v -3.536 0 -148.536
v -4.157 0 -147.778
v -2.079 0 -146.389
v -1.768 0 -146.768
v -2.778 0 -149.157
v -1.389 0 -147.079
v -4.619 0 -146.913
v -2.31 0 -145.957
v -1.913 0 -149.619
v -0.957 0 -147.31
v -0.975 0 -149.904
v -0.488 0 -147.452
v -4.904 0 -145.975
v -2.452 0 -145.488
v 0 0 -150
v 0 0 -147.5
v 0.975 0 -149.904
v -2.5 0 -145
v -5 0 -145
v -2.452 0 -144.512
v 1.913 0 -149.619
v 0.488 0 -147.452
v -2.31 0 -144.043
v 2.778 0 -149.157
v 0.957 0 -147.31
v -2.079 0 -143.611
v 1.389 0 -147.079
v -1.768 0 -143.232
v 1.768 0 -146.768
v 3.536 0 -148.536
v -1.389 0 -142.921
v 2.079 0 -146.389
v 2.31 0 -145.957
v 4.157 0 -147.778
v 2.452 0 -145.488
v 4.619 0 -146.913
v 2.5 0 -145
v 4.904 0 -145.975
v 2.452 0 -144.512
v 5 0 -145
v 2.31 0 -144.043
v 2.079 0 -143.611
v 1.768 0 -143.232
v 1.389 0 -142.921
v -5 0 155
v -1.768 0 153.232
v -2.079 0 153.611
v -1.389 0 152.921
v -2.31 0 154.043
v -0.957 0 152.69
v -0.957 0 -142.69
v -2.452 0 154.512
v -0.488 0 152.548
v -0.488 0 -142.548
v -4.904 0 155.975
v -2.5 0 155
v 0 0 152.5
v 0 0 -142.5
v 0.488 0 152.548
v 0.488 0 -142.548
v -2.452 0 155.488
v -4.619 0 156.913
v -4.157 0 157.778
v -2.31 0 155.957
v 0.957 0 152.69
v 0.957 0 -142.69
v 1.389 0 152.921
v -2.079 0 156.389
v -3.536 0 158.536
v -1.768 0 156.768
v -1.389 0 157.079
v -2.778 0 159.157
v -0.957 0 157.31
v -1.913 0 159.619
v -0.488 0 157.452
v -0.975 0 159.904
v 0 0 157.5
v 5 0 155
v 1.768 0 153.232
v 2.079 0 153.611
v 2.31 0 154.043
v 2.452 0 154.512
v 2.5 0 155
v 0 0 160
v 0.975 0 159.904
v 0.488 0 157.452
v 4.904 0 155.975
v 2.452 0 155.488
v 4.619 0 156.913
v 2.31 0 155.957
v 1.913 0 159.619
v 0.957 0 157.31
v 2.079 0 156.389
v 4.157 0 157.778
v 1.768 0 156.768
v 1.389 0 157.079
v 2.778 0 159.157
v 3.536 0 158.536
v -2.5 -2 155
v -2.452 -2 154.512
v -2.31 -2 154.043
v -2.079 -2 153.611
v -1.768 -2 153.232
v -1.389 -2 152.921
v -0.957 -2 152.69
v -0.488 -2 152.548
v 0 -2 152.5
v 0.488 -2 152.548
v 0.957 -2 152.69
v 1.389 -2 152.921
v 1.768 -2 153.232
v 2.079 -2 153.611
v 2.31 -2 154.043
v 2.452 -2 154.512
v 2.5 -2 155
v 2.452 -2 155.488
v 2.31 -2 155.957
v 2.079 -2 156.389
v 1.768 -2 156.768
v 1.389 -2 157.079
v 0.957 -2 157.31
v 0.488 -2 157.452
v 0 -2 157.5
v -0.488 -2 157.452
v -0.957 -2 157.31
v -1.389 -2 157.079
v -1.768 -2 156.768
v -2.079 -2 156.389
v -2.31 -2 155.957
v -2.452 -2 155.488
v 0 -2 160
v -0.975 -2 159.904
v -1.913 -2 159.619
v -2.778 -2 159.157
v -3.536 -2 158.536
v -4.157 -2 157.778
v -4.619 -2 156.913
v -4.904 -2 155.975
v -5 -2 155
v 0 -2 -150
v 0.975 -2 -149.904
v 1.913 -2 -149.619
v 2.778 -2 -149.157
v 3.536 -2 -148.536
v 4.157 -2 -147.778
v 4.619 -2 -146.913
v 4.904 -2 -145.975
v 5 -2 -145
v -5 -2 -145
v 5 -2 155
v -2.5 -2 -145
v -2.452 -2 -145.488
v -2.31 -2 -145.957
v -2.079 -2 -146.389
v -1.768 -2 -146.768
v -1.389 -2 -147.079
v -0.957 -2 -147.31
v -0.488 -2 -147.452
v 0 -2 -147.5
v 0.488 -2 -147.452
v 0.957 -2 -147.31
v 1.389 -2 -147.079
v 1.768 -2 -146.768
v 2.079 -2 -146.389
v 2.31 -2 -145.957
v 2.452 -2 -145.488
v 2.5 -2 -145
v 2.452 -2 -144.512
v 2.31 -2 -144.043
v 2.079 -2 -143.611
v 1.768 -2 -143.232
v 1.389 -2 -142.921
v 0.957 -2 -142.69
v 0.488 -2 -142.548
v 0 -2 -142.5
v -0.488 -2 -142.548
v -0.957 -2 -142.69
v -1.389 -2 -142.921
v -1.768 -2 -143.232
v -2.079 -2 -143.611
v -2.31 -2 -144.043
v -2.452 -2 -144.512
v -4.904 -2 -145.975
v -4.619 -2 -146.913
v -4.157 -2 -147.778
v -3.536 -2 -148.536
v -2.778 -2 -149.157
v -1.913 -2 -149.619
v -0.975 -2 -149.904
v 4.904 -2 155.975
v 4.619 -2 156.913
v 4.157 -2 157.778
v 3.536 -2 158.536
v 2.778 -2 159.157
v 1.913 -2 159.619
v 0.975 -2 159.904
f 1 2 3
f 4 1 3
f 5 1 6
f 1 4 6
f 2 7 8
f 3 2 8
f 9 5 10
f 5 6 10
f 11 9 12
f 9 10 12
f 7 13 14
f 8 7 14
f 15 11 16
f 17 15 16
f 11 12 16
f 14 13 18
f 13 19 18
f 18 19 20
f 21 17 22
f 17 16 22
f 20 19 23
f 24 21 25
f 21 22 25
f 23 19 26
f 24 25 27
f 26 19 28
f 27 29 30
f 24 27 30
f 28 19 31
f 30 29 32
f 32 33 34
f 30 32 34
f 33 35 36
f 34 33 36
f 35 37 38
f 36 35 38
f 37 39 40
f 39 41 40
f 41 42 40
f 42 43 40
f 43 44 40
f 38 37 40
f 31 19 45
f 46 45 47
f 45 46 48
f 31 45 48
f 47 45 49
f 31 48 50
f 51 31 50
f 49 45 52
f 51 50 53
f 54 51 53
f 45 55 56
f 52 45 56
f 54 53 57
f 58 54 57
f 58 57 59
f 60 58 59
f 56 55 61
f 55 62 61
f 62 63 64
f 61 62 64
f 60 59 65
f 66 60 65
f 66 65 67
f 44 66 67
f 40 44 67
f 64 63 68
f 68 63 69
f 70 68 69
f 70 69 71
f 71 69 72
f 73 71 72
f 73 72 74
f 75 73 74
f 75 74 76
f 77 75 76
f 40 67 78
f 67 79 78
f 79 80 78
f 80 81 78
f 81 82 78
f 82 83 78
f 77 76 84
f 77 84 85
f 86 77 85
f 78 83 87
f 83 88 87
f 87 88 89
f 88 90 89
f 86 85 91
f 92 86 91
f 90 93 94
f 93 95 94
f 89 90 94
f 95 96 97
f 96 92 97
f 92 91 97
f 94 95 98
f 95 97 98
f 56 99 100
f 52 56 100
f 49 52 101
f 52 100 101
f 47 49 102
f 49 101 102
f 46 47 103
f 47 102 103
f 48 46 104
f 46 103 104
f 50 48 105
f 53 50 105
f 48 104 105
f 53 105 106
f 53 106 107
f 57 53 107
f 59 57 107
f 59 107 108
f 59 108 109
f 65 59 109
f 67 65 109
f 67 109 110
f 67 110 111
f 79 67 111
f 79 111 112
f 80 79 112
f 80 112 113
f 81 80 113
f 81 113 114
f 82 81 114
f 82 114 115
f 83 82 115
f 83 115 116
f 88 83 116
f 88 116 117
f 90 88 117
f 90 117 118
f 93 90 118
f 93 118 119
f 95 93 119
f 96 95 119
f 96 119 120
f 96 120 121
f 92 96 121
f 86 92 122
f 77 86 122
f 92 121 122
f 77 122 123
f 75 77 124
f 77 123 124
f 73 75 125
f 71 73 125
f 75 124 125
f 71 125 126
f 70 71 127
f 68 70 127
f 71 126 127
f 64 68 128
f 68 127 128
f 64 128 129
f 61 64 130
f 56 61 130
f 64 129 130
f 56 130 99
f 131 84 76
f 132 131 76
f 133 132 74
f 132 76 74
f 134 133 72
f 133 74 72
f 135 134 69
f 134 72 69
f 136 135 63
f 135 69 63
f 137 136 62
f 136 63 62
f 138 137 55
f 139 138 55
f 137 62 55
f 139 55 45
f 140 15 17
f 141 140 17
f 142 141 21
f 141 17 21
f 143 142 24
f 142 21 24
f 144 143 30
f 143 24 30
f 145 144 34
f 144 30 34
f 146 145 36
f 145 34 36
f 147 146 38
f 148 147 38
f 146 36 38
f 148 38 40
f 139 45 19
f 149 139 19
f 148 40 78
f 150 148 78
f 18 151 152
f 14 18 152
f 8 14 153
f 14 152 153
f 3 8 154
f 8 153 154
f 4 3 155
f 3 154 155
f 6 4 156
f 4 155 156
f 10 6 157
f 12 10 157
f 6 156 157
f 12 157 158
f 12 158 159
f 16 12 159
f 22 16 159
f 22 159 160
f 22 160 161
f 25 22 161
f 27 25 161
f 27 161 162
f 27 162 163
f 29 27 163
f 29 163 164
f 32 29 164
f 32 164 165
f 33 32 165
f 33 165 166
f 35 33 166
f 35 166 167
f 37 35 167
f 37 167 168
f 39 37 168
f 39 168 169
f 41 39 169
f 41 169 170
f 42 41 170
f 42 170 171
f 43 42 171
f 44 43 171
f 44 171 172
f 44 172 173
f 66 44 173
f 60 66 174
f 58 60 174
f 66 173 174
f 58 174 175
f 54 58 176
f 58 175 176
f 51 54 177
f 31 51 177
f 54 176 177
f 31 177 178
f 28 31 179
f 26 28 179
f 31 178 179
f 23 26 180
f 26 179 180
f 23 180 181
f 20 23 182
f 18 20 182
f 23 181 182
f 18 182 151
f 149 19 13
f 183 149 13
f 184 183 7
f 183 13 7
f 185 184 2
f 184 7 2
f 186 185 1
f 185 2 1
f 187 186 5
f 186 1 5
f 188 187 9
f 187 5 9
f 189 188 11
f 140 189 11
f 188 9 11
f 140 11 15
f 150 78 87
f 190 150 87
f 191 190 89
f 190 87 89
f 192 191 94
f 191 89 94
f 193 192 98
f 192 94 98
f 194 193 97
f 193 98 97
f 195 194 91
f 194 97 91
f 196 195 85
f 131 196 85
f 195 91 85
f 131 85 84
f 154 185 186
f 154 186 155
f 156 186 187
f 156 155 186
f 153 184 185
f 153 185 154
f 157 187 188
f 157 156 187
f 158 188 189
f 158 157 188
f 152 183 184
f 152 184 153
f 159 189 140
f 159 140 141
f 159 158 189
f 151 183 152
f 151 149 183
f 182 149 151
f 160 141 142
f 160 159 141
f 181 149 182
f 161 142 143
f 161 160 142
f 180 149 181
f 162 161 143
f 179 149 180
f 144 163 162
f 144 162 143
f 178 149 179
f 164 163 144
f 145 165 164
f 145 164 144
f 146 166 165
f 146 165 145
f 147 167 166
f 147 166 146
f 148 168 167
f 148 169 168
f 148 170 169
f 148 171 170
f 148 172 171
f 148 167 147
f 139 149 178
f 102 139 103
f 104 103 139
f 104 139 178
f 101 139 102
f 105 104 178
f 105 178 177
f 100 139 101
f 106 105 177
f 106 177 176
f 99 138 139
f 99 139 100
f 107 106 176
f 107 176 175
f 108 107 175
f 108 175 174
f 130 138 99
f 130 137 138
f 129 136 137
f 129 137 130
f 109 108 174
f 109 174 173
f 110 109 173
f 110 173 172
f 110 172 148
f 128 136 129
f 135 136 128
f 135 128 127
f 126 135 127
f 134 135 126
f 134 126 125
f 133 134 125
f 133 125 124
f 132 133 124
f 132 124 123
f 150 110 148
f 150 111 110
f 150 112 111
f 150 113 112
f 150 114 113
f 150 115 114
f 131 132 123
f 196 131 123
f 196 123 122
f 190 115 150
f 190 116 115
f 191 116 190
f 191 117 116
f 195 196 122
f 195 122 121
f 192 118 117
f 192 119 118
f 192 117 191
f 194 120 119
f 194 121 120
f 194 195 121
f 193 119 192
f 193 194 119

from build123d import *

# Parameters (mm, degrees)
F1_DEPTH = 2
F2_D     = 5
F3_D     = 5


with BuildPart() as f1:
    # F0 (on Front) → F1 (new body)
    with BuildSketch(Plane.XZ):
        with BuildLine():
            ThreePointArc((0, 160), (-3.5355339059, 158.5355339059), (-5, 155))
            Line((-5, 155), (-5, -145))
            ThreePointArc((-5, -145), (-3.5355339059, -148.5355339059), (0, -150))
            ThreePointArc((0, -150), (3.5355339059, -148.5355339059), (5, -145))
            Line((5, -145), (5, 155))
            ThreePointArc((5, 155), (3.5355339059, 158.5355339059), (0, 160))
        make_face()
    extrude(amount=F1_DEPTH)

    # F2 (through all)
    with Locations(Plane(origin=(0, 0, 0), x_dir=(1, 0, 0), z_dir=(0, 1, 0))):
        with Locations((0, -155)):
            Hole(F2_D / 2)

    # F3 (through all)
    with Locations(Plane(origin=(0, 0, 0), x_dir=(1, 0, 0), z_dir=(0, 1, 0))):
        with Locations((0, 145)):
            Hole(F3_D / 2)


solid = f1.part
